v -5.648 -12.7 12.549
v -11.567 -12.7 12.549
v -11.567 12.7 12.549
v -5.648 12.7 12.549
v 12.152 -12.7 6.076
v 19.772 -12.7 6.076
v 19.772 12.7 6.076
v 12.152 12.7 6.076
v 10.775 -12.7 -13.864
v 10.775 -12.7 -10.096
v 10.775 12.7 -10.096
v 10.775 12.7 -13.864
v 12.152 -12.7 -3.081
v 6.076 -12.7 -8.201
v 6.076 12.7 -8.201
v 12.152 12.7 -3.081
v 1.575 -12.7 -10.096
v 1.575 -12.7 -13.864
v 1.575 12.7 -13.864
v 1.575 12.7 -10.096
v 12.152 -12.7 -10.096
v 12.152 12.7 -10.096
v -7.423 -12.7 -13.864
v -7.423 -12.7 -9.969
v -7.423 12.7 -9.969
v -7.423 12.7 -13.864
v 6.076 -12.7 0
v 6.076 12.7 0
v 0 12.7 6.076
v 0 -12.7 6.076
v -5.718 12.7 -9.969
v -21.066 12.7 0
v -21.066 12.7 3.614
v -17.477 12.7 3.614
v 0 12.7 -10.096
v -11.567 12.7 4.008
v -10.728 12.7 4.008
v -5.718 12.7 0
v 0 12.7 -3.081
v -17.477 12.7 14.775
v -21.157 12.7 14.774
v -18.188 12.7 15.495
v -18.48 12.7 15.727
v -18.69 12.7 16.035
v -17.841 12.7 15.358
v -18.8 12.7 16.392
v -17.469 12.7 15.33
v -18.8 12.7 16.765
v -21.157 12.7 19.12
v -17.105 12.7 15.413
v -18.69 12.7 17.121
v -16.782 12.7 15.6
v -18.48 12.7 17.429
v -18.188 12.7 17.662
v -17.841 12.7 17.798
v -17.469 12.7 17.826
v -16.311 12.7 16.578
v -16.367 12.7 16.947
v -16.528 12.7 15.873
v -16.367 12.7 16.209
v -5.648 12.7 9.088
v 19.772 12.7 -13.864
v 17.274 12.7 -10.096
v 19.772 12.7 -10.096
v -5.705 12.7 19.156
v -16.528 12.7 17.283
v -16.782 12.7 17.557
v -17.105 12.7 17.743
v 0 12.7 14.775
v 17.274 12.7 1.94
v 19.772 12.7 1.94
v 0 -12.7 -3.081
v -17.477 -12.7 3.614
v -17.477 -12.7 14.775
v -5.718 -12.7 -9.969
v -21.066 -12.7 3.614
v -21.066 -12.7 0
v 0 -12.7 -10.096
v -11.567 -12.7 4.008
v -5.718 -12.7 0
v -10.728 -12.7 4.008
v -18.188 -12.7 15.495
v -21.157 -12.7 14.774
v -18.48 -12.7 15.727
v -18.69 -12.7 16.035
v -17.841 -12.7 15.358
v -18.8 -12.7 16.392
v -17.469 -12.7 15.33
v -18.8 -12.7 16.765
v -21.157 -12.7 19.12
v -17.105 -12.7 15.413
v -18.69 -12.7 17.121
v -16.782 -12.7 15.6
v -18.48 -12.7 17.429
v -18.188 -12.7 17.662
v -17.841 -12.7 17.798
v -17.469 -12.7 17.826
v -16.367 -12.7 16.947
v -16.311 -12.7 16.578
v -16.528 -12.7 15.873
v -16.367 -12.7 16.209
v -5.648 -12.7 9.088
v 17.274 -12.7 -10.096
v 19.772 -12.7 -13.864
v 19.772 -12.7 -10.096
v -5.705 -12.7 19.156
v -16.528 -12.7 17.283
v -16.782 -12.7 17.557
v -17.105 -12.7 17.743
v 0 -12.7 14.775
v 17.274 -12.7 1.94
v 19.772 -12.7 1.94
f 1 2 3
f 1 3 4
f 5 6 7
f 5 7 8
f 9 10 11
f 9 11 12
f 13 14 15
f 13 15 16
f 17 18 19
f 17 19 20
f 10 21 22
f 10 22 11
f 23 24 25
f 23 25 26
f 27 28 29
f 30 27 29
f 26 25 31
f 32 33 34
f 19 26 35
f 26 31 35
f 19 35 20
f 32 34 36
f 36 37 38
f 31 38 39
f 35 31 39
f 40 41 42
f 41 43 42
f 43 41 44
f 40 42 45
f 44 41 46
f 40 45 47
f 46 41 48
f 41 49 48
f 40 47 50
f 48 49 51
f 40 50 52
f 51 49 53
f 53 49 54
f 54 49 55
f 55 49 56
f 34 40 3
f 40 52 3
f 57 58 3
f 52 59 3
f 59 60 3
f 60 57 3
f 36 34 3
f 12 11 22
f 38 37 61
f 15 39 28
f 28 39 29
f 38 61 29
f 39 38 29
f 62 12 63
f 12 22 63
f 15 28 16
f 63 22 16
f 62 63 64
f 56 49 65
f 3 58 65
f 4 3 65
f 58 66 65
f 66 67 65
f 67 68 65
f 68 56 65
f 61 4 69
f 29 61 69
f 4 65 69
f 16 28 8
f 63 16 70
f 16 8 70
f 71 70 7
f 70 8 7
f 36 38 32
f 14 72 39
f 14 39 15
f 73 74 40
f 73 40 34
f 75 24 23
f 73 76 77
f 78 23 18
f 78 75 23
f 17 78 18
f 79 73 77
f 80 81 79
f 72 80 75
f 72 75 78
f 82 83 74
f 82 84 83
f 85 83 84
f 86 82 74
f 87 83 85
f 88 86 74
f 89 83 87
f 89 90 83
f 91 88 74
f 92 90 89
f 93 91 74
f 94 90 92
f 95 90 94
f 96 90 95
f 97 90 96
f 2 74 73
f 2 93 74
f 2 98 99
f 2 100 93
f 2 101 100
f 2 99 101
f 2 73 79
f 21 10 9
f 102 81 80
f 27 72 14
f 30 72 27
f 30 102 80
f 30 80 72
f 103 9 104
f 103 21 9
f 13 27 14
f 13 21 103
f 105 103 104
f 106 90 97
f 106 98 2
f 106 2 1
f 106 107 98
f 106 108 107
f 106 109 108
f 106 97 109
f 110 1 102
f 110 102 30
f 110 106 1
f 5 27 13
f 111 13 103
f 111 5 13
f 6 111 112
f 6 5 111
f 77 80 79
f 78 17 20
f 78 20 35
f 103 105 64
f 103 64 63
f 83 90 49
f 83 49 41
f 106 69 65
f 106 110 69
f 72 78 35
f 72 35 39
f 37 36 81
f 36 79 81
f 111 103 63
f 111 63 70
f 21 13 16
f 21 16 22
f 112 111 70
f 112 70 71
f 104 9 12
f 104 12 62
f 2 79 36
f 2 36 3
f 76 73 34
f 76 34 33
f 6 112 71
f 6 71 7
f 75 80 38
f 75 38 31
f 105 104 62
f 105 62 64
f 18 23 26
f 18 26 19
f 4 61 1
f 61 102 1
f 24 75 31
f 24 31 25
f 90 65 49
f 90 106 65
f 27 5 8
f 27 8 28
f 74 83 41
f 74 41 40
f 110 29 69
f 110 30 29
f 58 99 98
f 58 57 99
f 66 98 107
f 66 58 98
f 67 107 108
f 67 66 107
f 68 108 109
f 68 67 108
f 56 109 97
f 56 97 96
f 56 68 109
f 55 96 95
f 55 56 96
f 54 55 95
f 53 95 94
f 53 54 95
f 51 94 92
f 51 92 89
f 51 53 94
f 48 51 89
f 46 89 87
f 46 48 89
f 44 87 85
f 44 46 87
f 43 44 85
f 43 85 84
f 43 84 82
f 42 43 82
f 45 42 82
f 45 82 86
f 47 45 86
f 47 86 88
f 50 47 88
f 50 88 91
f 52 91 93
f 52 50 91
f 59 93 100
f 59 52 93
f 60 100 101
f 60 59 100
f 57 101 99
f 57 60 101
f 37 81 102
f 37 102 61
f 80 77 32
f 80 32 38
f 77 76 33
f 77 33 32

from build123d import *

# Parameters (mm, degrees)
F0_W     = 5.919209
F0_H     = 8.541538
F0_R     = 1.251395
F1_DEPTH = 12.7
F2_SIZE  = 5.08


with BuildPart() as f1:
    # F0 (on Front) → F1 (new body, symmetric)
    with BuildSketch(Plane.XZ):
        Polygon((-5.705478, 19.156427), (-21.156731, 19.119902), (-21.156731, 17.007546), (-21.156731, 14.773603), (-17.477301, 14.774974), (-17.477301, 3.613727), (-21.065827, 3.613727), (-21.065827, 0), (-5.71827, 0), (-3.851344, 0), (0, 6.075916), (0, 14.774974), align=None)
        with Locations((-8.607242, 8.278721)):
            Rectangle(F0_W, F0_H, mode=Mode.SUBTRACT)
        with Locations((-17.562349, 16.578252)):
            Circle(F0_R, mode=Mode.SUBTRACT)
        Polygon((6.075916, 0), (0, 6.075916), (-3.851344, 0), (-5.71827, 0), (-5.71827, -2.018174), (-5.71827, -9.968552), (-7.422996, -9.968552), (-7.422996, -13.863573), (1.574568, -13.863573), (1.574568, -10.095728), (0, -10.095728), (0, -3.080508), (6.075916, -8.201027), (12.151833, -3.080508), (12.151833, -10.095728), (10.774577, -10.095728), (10.774577, -13.863573), (19.772141, -13.863573), (19.772141, -10.095728), (17.274087, -10.095728), (17.274087, 1.940169), (19.772141, 1.940169), (19.772141, 6.075916), (12.151833, 6.075916), align=None)
    extrude(amount=F1_DEPTH, both=True)

    # F2
    f2_edges = [f1.edges().sort_by_distance(p)[0] for p in [
        (-5.647637, 0, 4.007952),
    ]]
    chamfer(f2_edges, length=F2_SIZE)


solid = f1.part
